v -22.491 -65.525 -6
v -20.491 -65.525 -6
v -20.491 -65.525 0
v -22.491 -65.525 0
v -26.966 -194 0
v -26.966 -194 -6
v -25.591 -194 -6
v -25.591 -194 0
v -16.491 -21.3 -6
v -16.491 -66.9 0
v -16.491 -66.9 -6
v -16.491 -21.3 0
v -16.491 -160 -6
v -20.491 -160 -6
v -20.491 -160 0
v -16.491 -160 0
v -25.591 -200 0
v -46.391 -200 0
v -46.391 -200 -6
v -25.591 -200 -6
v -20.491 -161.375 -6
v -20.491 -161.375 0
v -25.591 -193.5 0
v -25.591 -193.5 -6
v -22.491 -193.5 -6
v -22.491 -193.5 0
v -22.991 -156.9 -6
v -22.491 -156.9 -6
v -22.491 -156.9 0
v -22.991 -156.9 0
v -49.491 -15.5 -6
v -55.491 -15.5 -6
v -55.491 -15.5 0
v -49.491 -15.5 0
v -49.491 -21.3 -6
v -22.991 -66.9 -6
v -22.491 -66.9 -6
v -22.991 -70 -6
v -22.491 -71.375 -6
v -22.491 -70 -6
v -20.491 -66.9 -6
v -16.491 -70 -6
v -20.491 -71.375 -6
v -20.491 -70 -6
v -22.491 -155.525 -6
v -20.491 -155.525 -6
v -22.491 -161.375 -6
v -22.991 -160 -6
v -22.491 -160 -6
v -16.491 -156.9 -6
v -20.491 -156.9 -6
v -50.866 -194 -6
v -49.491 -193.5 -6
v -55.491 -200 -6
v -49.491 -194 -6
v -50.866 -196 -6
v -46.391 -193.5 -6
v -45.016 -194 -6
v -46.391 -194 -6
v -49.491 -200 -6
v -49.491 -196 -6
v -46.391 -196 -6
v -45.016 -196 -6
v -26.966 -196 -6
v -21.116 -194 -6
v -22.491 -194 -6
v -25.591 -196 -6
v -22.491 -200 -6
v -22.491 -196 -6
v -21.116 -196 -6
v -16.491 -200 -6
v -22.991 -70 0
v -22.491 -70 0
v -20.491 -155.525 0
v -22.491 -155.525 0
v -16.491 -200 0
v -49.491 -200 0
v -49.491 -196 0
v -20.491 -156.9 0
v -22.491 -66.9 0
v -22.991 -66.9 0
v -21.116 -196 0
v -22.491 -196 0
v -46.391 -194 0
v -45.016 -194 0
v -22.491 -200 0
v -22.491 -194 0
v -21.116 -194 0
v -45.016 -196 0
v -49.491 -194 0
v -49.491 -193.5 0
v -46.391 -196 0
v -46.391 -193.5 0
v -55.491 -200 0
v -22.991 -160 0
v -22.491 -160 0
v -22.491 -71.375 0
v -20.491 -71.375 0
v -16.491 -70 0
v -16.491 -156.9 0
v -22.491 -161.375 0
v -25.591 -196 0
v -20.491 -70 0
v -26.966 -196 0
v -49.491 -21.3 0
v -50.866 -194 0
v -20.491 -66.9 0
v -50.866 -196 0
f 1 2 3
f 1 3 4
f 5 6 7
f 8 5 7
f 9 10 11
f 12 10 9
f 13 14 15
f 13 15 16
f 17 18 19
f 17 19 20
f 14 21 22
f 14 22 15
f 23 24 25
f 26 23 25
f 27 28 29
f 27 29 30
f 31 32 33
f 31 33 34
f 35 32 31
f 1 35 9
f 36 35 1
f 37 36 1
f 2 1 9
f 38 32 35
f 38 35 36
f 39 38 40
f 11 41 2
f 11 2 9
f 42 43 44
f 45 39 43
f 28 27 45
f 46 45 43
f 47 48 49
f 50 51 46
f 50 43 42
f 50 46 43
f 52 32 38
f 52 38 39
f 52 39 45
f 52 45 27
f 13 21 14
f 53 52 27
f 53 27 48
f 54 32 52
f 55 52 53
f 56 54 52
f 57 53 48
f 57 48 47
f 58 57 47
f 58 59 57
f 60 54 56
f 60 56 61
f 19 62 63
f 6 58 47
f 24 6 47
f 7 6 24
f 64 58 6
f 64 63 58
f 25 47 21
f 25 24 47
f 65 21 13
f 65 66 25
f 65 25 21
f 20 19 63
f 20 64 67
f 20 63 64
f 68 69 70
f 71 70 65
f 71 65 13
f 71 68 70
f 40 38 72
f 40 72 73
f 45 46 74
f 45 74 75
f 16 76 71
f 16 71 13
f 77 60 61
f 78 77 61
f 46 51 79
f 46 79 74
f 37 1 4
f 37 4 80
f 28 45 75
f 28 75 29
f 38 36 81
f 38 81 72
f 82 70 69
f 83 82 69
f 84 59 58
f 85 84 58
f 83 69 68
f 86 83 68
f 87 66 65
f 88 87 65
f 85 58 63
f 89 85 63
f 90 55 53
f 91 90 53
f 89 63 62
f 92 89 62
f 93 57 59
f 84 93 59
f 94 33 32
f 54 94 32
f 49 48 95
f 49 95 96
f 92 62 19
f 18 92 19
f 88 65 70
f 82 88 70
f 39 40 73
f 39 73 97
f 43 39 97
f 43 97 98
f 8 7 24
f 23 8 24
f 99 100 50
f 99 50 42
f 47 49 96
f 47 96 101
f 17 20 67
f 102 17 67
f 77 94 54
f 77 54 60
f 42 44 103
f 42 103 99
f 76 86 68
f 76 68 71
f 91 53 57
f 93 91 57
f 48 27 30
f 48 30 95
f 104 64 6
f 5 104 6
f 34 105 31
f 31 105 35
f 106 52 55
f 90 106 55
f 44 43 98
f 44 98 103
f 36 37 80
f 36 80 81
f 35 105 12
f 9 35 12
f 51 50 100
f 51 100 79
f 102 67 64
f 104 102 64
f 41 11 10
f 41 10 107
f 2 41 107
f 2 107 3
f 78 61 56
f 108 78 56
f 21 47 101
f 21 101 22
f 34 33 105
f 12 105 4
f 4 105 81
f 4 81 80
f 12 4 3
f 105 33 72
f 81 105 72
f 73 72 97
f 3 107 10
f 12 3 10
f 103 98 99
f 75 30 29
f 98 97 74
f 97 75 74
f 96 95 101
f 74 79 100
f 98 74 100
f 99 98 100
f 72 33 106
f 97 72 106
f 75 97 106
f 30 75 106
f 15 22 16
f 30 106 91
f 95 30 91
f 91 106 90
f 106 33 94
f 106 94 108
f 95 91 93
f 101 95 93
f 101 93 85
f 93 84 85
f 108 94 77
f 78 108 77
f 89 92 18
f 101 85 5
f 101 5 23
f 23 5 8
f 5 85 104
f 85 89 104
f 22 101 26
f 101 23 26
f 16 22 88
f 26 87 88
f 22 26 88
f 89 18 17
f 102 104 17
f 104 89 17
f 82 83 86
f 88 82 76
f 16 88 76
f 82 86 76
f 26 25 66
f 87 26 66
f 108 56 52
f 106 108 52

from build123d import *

# Parameters (mm, degrees)
SZKIC1_W                    = 39
SZKIC1_H                    = 178.7
DODANIE_WYCI_GNI_CIE1_DEPTH = 6
WYTNIJ_WYCI_GNI_CIE1_DEPTH  = 208.642171135
WYTNIJ_WYCI_GNI_CIE2_DEPTH  = 208.642171135
SZYK_LINIOWY1_COUNT         = 2
SZYK_LINIOWY1_PITCH         = 90
SZYK_LINIOWY2_COUNT         = 2
SZYK_LINIOWY2_PITCH         = 23.9
SZKIC4_W                    = 6
SZKIC4_H                    = 6
DODANIE_WYCI_GNI_CIE2_DEPTH = 5.8


with BuildPart() as part:
    # Szkic1 → Dodanie-wyciągnięcie1 (new body)
    with BuildSketch(Plane.XY):
        with Locations((-35.991181586, -110.65)):
            Rectangle(SZKIC1_W, SZKIC1_H)
    extrude(amount=-DODANIE_WYCI_GNI_CIE1_DEPTH)

    # Szkic2 → Wytnij-wyciągnięcie1 (cut, through all)
    with BuildSketch(Plane(origin=(0, 0, -6), x_dir=(-1, 0, 0), z_dir=(0, 0, -1))):
        Polygon((16.491181586, -160), (16.491181586, -156.9), (20.491181586, -156.9), (20.491181586, -155.525), (22.491181586, -155.525), (22.491181586, -156.9), (22.991181586, -156.9), (22.991181586, -160), (22.491181586, -160), (22.491181586, -161.375), (20.491181586, -161.375), (20.491181586, -160), align=None)
    wytnij_wyci_gni_cie1 = extrude(amount=-WYTNIJ_WYCI_GNI_CIE1_DEPTH, mode=Mode.SUBTRACT)

    # Szkic3 → Wytnij-wyciągnięcie2 (cut, through all)
    with BuildSketch(Plane(origin=(0, 0, -6), x_dir=(-1, 0, 0), z_dir=(0, 0, -1))):
        Polygon((49.491181586, -200), (49.491181586, -196), (50.866181586, -196), (50.866181586, -194), (49.491181586, -194), (49.491181586, -193.5), (46.391181586, -193.5), (46.391181586, -194), (45.016181586, -194), (45.016181586, -196), (46.391181586, -196), (46.391181586, -200), align=None)
    wytnij_wyci_gni_cie2 = extrude(amount=-WYTNIJ_WYCI_GNI_CIE2_DEPTH, mode=Mode.SUBTRACT)

    # Szyk liniowy1: Wytnij-wyciągnięcie1 ×2
    with Locations(*[(0, i * SZYK_LINIOWY1_PITCH, 0) for i in range(1, SZYK_LINIOWY1_COUNT)]):
        add(wytnij_wyci_gni_cie1, mode=Mode.SUBTRACT)

    # Szyk liniowy2: Wytnij-wyciągnięcie2 ×2
    with Locations(*[(i * SZYK_LINIOWY2_PITCH, 0, 0) for i in range(1, SZYK_LINIOWY2_COUNT)]):
        add(wytnij_wyci_gni_cie2, mode=Mode.SUBTRACT)

    # Szkic4 → Dodanie-wyciągnięcie2 (add)
    with BuildSketch(Plane(origin=(0, -21.3, 0), x_dir=(1, 0, 0), z_dir=(0, 1, 0))):
        with Locations((-52.491181586, 3)):
            Rectangle(SZKIC4_W, SZKIC4_H)
    extrude(amount=DODANIE_WYCI_GNI_CIE2_DEPTH)


solid = part.part
